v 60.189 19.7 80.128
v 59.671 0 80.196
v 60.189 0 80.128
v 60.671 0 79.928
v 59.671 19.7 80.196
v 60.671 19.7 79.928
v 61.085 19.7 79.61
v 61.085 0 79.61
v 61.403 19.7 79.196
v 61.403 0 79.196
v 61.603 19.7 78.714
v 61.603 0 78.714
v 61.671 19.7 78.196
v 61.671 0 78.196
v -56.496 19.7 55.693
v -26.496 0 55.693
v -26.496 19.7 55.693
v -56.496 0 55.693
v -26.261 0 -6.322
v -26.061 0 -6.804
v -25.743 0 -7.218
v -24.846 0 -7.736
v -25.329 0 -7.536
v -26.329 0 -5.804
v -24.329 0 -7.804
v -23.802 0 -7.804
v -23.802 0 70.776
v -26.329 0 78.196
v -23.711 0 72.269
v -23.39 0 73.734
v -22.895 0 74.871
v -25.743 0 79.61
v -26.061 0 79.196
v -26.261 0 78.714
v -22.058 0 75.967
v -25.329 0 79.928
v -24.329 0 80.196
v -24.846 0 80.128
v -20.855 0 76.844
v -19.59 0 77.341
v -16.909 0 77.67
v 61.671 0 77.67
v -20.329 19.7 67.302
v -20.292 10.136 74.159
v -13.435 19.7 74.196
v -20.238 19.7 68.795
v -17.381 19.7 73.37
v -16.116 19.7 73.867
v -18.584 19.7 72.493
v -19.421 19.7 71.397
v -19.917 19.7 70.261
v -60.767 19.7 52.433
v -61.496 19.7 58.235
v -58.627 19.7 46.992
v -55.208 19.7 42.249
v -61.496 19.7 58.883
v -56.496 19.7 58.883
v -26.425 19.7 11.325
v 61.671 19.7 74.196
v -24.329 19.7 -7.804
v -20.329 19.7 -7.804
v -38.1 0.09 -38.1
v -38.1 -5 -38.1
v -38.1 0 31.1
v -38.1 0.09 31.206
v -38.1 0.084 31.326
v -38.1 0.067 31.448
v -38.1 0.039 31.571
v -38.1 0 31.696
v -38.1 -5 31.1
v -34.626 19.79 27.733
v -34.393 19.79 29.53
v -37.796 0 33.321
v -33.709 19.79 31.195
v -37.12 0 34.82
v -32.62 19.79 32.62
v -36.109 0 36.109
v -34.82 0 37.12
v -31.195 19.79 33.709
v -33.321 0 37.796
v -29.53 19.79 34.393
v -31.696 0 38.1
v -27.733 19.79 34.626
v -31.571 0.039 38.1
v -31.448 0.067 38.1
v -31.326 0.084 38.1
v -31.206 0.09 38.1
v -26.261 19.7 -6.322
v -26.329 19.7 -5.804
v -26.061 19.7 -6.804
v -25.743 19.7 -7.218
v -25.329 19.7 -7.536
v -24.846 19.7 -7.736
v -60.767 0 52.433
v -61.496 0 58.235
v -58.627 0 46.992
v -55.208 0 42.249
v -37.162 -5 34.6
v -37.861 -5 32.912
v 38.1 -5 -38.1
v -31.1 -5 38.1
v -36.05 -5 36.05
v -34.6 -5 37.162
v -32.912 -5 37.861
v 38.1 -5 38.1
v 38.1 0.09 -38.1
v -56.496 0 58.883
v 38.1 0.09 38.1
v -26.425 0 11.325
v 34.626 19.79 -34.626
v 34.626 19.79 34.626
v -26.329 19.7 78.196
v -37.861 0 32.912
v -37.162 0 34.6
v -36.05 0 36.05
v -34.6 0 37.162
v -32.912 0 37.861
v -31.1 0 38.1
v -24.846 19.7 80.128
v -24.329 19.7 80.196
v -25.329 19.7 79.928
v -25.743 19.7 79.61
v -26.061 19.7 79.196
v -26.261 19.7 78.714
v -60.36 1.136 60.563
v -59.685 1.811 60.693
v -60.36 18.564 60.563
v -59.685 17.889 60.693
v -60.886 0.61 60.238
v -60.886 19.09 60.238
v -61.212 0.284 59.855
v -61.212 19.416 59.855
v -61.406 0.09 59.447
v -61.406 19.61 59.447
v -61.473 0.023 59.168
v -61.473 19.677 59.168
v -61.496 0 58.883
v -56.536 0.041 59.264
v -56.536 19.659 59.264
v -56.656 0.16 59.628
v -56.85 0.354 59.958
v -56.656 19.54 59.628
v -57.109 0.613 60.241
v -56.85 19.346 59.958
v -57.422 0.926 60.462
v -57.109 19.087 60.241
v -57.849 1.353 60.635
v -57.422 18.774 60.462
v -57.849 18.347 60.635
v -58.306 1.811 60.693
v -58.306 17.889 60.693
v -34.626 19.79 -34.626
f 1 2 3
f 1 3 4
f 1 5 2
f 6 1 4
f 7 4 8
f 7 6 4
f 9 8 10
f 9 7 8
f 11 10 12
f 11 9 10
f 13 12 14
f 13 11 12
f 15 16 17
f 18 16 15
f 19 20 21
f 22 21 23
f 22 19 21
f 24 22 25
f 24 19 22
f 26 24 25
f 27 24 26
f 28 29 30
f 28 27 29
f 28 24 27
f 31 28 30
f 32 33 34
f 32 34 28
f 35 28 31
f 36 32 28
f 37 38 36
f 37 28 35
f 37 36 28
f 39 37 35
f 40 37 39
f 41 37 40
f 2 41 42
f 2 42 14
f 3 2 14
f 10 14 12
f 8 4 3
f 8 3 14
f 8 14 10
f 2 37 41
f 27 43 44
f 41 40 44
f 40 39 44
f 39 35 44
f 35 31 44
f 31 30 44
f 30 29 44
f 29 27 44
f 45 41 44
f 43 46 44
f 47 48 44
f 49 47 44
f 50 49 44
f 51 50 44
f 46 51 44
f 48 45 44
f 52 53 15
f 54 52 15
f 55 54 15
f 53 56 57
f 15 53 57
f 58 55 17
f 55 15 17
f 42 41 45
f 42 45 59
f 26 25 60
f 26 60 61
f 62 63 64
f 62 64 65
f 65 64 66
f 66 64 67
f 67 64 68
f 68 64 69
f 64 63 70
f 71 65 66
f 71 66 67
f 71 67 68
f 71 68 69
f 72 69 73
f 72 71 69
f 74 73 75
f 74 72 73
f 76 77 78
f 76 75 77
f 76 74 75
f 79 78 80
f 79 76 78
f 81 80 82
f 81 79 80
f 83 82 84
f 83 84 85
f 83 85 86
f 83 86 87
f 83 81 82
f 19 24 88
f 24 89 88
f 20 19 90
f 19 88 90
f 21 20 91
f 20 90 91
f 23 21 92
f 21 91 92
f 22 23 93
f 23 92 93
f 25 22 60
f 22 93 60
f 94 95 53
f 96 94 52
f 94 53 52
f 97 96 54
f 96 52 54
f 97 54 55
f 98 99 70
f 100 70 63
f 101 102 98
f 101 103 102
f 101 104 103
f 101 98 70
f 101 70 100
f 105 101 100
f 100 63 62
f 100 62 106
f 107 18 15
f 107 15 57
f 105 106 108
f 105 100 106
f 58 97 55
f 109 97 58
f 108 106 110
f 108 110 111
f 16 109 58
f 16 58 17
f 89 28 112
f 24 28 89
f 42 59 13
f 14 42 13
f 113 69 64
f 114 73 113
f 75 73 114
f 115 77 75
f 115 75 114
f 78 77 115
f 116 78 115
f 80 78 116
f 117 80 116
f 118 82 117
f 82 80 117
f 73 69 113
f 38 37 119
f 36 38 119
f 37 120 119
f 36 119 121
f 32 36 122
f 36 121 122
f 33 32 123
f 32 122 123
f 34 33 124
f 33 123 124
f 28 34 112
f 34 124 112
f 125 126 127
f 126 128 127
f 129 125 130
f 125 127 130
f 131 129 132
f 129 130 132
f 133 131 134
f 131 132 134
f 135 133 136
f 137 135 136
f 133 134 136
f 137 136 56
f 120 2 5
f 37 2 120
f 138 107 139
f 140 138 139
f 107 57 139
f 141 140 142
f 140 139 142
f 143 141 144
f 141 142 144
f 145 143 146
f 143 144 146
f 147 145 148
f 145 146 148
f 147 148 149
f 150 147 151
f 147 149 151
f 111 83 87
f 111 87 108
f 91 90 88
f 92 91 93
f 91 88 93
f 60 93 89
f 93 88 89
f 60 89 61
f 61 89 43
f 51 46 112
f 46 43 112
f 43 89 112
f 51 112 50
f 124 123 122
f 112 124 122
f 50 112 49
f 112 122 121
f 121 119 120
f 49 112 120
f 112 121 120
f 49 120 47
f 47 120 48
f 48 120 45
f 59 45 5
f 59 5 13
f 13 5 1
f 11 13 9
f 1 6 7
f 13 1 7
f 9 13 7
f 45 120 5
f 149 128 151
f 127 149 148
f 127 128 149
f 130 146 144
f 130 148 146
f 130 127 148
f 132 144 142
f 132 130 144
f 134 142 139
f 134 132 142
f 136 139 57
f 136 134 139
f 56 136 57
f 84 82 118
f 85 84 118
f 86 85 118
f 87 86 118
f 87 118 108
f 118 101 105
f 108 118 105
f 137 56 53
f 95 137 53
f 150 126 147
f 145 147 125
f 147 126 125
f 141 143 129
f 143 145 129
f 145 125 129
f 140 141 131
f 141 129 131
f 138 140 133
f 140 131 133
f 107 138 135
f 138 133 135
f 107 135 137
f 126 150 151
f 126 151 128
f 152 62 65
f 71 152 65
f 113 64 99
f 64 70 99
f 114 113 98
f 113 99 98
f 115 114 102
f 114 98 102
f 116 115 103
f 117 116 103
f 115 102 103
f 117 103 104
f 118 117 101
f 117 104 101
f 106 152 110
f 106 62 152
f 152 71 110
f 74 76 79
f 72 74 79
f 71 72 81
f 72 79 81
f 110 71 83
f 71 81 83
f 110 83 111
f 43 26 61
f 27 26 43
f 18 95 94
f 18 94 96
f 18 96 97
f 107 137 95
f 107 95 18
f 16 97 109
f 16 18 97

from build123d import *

# Parameters (mm, degrees)
F0_W        = 76.2
F0_H        = 76.2
F1_DEPTH    = 5
F2_R        = 7
F3_DEPTH    = 19.79
F4_C1_SIZE2 = 3.47364152
F4_C1_SIZE  = 19.7
F4_C2_SIZE2 = 19.7
F4_C2_SIZE  = 3.47364152
F4_C3_SIZE2 = 19.7
F4_C3_SIZE  = 3.47364152
F4_C4_SIZE2 = 19.7
F4_C4_SIZE  = 3.47364152
F5_T1_DEPTH = 88.2233868706
F7_DEPTH    = 19.7
F8_SIZE2    = 3.473632
F8_SIZE     = 19.69999
F9_T4_DEPTH = 54.2633149659
F11_DEPTH   = 19.7
F12_R       = 1.8106601718
F13_R       = 23.4632344254
F14_R       = 2
F15_R       = 2
F16_R       = 2


# Not quite as in the source:
# - a fillet or chamfer that OpenCascade refuses, or shapes differently, is made with other operations: its cross-section is extruded or revolved along the edge and cut away or added
# - a fillet or chamfer is up to 0.001 mm smaller than in the source, because OpenCascade refuses the exact size


with BuildPart() as f1:
    # F0 (on Front) → F1 (new body)
    with BuildSketch(Plane.XZ):
        Rectangle(F0_W, F0_H)
    extrude(amount=F1_DEPTH)

    # F2
    f2_edges = [f1.edges().sort_by_distance(p)[0] for p in [
        (-38.1, -2.5, 38.1),
    ]]
    fillet(f2_edges, radius=F2_R)

    # F0 (on Front) → F3 (join)
    with BuildSketch(Plane.XZ):
        Rectangle(F0_W, F0_H)
    extrude(amount=-F3_DEPTH)

    # F4: chamfer of 19.7 x 3.47364152 on 4 edges, made by hand

    # F4_c1
    f4_c1_edges = [f1.edges().sort_by_distance(p)[0] for p in [
        (0, 19.79, 38.1),
    ]]
    f4_c1_side = f1.faces().sort_by_distance((0, 19.7205271696, 38.1))[0]
    chamfer(f4_c1_edges, length=F4_C1_SIZE, length2=F4_C1_SIZE2, reference=f4_c1_side)

    # F4_c2
    f4_c2_edges = [f1.edges().sort_by_distance(p)[0] for p in [
        (0, 19.79, -38.1),
    ]]
    f4_c2_side = f1.faces().sort_by_distance((0, 19.79, -38.0305271696))[0]
    chamfer(f4_c2_edges, length=F4_C2_SIZE, length2=F4_C2_SIZE2, reference=f4_c2_side)

    # F4_c3
    f4_c3_edges = [f1.edges().sort_by_distance(p)[0] for p in [
        (38.1, 19.79, 0),
    ]]
    f4_c3_side = f1.faces().sort_by_distance((38.0305271696, 19.79, 0))[0]
    chamfer(f4_c3_edges, length=F4_C3_SIZE, length2=F4_C3_SIZE2, reference=f4_c3_side)

    # F4_c4
    f4_c4_edges = [f1.edges().sort_by_distance(p)[0] for p in [
        (-38.1, 19.79, 0),
    ]]
    f4_c4_side = f1.faces().sort_by_distance((-38.0305271696, 19.79, 0))[0]
    chamfer(f4_c4_edges, length=F4_C4_SIZE, length2=F4_C4_SIZE2, reference=f4_c4_side)

    # F5: fillet of radius 7 on 1 edges, made by hand

    # F5_s2 → F5_t1 (cut)
    with BuildSketch(Plane(origin=(4.1632046596, 23.6107068972, -4.1632046596), x_dir=(0.984807753, -0.1736481777, 0), z_dir=(-0.1710878697, -0.9702875252, 0.1710878697))):
        with BuildLine():
            ThreePointArc((-37.5368037258, 29.629479716), (-35.560623527, 34.5040293983), (-30.747879553, 36.6262966348))
            Line((-30.747879553, 36.6262966348), (-37.5368037258, 36.4214923928))
            Line((-37.5368037258, 36.4214923928), (-37.5368037258, 29.629479716))
        make_face()
    extrude(amount=F5_T1_DEPTH, mode=Mode.SUBTRACT)


with BuildPart() as f7:
    # F6 (on Front) → F7 (new body)
    with BuildSketch(Plane.XZ):
        Polygon((-26.3288263232, 80.1959456988), (-26.3288263232, -7.8040543012), (-20.3288263232, -7.8040543012), (-20.3288263232, 74.1959456988), (61.6711736768, 74.1959456988), (61.6711736768, 80.1959456988), align=None)
    extrude(amount=-F7_DEPTH)

    # F8 (size 19.7 and 3.47364152 in the source; OpenCascade refuses exactly that, so slightly less here)
    f8_edges = [f7.edges().sort_by_distance(p)[0] for p in [
        (-20.328826, 0, 33.195946),
        (20.671174, 0, 74.195946),
    ]]
    chamfer(f8_edges, length=F8_SIZE, length2=F8_SIZE2)

    # F9: fillet of radius 7 on 1 edges, made by hand


with BuildPart() as f9_tool2:
    # F9_s3 → F9_t4 (new body)
    with BuildSketch(Plane(origin=(3.4085222403, 19.330733379, -3.4085222403), x_dir=(0.9848078193, -0.1736478016, 0), z_dir=(-0.1710875101, -0.9702876521, 0.1710875101))):
        with BuildLine():
            add(Edge.make_bspline(
                [(-23.4408470757, 69.0252446825), (-23.4408470757, 75.8172582472), (-16.6519219887, 76.0220616289)],
                knots=[0, 0, 0, 1, 1, 1], degree=2, weights=[1, 1, 1]))
            Line((-16.6519219887, 76.0220616289), (-16.656143487, 76.1619979678))
            Line((-16.656143487, 76.1619979678), (-23.5808470757, 75.9530985184))
            Line((-23.5808470757, 75.9530985184), (-23.5808470757, 69.0252446825))
            Line((-23.5808470757, 69.0252446825), (-23.4408470757, 69.0252446825))
        make_face()
    extrude(amount=F9_T4_DEPTH)

    split(bisect_by=Plane.XZ.offset(-19.7), keep=Keep.TOP)

    split(bisect_by=Plane.XZ, keep=Keep.BOTTOM)


with BuildPart() as f7_1:
    add(f7.part)

    # F9_t1: union F9_tool2
    add(f9_tool2.part)

    # F14
    f14_edges = [f7_1.edges().sort_by_distance(p)[0] for p in [
        (-26.328826, 9.85, 80.195946),
    ]]
    fillet(f14_edges, radius=F14_R)

    # F15
    f15_edges = [f7_1.edges().sort_by_distance(p)[0] for p in [
        (-26.328826, 9.85, -7.804054),
    ]]
    fillet(f15_edges, radius=F15_R)

    # F16
    f16_edges = [f7_1.edges().sort_by_distance(p)[0] for p in [
        (61.671174, 9.85, 80.195946),
    ]]
    fillet(f16_edges, radius=F16_R)


with BuildPart() as f11:
    # F10 (on Front) → F11 (new body)
    with BuildSketch(Plane.XZ):
        Polygon((-26.4252573252, 11.3248322159), (-26.4958144724, 55.6931681931), (-56.4958144724, 55.6931681931), (-56.4958144724, 60.6931681931), (-61.4958144724, 60.6931681931), (-61.4958144724, 49.005292356), align=None)
    extrude(amount=-F11_DEPTH)

    # F12
    f12_edges = [f11.edges().sort_by_distance(p)[0] for p in [
        (-56.495814, 9.85, 60.693168),
        (-61.495814, 9.85, 60.693168),
        (-58.995814, 0, 60.693168),
        (-58.995814, 19.7, 60.693168),
    ]]
    fillet(f12_edges, radius=F12_R)

    # F13
    f13_edges = [f11.edges().sort_by_distance(p)[0] for p in [
        (-61.495814, 9.85, 49.005292),
    ]]
    fillet(f13_edges, radius=F13_R)


solid = Compound([f1.part, f7_1.part, f11.part])
